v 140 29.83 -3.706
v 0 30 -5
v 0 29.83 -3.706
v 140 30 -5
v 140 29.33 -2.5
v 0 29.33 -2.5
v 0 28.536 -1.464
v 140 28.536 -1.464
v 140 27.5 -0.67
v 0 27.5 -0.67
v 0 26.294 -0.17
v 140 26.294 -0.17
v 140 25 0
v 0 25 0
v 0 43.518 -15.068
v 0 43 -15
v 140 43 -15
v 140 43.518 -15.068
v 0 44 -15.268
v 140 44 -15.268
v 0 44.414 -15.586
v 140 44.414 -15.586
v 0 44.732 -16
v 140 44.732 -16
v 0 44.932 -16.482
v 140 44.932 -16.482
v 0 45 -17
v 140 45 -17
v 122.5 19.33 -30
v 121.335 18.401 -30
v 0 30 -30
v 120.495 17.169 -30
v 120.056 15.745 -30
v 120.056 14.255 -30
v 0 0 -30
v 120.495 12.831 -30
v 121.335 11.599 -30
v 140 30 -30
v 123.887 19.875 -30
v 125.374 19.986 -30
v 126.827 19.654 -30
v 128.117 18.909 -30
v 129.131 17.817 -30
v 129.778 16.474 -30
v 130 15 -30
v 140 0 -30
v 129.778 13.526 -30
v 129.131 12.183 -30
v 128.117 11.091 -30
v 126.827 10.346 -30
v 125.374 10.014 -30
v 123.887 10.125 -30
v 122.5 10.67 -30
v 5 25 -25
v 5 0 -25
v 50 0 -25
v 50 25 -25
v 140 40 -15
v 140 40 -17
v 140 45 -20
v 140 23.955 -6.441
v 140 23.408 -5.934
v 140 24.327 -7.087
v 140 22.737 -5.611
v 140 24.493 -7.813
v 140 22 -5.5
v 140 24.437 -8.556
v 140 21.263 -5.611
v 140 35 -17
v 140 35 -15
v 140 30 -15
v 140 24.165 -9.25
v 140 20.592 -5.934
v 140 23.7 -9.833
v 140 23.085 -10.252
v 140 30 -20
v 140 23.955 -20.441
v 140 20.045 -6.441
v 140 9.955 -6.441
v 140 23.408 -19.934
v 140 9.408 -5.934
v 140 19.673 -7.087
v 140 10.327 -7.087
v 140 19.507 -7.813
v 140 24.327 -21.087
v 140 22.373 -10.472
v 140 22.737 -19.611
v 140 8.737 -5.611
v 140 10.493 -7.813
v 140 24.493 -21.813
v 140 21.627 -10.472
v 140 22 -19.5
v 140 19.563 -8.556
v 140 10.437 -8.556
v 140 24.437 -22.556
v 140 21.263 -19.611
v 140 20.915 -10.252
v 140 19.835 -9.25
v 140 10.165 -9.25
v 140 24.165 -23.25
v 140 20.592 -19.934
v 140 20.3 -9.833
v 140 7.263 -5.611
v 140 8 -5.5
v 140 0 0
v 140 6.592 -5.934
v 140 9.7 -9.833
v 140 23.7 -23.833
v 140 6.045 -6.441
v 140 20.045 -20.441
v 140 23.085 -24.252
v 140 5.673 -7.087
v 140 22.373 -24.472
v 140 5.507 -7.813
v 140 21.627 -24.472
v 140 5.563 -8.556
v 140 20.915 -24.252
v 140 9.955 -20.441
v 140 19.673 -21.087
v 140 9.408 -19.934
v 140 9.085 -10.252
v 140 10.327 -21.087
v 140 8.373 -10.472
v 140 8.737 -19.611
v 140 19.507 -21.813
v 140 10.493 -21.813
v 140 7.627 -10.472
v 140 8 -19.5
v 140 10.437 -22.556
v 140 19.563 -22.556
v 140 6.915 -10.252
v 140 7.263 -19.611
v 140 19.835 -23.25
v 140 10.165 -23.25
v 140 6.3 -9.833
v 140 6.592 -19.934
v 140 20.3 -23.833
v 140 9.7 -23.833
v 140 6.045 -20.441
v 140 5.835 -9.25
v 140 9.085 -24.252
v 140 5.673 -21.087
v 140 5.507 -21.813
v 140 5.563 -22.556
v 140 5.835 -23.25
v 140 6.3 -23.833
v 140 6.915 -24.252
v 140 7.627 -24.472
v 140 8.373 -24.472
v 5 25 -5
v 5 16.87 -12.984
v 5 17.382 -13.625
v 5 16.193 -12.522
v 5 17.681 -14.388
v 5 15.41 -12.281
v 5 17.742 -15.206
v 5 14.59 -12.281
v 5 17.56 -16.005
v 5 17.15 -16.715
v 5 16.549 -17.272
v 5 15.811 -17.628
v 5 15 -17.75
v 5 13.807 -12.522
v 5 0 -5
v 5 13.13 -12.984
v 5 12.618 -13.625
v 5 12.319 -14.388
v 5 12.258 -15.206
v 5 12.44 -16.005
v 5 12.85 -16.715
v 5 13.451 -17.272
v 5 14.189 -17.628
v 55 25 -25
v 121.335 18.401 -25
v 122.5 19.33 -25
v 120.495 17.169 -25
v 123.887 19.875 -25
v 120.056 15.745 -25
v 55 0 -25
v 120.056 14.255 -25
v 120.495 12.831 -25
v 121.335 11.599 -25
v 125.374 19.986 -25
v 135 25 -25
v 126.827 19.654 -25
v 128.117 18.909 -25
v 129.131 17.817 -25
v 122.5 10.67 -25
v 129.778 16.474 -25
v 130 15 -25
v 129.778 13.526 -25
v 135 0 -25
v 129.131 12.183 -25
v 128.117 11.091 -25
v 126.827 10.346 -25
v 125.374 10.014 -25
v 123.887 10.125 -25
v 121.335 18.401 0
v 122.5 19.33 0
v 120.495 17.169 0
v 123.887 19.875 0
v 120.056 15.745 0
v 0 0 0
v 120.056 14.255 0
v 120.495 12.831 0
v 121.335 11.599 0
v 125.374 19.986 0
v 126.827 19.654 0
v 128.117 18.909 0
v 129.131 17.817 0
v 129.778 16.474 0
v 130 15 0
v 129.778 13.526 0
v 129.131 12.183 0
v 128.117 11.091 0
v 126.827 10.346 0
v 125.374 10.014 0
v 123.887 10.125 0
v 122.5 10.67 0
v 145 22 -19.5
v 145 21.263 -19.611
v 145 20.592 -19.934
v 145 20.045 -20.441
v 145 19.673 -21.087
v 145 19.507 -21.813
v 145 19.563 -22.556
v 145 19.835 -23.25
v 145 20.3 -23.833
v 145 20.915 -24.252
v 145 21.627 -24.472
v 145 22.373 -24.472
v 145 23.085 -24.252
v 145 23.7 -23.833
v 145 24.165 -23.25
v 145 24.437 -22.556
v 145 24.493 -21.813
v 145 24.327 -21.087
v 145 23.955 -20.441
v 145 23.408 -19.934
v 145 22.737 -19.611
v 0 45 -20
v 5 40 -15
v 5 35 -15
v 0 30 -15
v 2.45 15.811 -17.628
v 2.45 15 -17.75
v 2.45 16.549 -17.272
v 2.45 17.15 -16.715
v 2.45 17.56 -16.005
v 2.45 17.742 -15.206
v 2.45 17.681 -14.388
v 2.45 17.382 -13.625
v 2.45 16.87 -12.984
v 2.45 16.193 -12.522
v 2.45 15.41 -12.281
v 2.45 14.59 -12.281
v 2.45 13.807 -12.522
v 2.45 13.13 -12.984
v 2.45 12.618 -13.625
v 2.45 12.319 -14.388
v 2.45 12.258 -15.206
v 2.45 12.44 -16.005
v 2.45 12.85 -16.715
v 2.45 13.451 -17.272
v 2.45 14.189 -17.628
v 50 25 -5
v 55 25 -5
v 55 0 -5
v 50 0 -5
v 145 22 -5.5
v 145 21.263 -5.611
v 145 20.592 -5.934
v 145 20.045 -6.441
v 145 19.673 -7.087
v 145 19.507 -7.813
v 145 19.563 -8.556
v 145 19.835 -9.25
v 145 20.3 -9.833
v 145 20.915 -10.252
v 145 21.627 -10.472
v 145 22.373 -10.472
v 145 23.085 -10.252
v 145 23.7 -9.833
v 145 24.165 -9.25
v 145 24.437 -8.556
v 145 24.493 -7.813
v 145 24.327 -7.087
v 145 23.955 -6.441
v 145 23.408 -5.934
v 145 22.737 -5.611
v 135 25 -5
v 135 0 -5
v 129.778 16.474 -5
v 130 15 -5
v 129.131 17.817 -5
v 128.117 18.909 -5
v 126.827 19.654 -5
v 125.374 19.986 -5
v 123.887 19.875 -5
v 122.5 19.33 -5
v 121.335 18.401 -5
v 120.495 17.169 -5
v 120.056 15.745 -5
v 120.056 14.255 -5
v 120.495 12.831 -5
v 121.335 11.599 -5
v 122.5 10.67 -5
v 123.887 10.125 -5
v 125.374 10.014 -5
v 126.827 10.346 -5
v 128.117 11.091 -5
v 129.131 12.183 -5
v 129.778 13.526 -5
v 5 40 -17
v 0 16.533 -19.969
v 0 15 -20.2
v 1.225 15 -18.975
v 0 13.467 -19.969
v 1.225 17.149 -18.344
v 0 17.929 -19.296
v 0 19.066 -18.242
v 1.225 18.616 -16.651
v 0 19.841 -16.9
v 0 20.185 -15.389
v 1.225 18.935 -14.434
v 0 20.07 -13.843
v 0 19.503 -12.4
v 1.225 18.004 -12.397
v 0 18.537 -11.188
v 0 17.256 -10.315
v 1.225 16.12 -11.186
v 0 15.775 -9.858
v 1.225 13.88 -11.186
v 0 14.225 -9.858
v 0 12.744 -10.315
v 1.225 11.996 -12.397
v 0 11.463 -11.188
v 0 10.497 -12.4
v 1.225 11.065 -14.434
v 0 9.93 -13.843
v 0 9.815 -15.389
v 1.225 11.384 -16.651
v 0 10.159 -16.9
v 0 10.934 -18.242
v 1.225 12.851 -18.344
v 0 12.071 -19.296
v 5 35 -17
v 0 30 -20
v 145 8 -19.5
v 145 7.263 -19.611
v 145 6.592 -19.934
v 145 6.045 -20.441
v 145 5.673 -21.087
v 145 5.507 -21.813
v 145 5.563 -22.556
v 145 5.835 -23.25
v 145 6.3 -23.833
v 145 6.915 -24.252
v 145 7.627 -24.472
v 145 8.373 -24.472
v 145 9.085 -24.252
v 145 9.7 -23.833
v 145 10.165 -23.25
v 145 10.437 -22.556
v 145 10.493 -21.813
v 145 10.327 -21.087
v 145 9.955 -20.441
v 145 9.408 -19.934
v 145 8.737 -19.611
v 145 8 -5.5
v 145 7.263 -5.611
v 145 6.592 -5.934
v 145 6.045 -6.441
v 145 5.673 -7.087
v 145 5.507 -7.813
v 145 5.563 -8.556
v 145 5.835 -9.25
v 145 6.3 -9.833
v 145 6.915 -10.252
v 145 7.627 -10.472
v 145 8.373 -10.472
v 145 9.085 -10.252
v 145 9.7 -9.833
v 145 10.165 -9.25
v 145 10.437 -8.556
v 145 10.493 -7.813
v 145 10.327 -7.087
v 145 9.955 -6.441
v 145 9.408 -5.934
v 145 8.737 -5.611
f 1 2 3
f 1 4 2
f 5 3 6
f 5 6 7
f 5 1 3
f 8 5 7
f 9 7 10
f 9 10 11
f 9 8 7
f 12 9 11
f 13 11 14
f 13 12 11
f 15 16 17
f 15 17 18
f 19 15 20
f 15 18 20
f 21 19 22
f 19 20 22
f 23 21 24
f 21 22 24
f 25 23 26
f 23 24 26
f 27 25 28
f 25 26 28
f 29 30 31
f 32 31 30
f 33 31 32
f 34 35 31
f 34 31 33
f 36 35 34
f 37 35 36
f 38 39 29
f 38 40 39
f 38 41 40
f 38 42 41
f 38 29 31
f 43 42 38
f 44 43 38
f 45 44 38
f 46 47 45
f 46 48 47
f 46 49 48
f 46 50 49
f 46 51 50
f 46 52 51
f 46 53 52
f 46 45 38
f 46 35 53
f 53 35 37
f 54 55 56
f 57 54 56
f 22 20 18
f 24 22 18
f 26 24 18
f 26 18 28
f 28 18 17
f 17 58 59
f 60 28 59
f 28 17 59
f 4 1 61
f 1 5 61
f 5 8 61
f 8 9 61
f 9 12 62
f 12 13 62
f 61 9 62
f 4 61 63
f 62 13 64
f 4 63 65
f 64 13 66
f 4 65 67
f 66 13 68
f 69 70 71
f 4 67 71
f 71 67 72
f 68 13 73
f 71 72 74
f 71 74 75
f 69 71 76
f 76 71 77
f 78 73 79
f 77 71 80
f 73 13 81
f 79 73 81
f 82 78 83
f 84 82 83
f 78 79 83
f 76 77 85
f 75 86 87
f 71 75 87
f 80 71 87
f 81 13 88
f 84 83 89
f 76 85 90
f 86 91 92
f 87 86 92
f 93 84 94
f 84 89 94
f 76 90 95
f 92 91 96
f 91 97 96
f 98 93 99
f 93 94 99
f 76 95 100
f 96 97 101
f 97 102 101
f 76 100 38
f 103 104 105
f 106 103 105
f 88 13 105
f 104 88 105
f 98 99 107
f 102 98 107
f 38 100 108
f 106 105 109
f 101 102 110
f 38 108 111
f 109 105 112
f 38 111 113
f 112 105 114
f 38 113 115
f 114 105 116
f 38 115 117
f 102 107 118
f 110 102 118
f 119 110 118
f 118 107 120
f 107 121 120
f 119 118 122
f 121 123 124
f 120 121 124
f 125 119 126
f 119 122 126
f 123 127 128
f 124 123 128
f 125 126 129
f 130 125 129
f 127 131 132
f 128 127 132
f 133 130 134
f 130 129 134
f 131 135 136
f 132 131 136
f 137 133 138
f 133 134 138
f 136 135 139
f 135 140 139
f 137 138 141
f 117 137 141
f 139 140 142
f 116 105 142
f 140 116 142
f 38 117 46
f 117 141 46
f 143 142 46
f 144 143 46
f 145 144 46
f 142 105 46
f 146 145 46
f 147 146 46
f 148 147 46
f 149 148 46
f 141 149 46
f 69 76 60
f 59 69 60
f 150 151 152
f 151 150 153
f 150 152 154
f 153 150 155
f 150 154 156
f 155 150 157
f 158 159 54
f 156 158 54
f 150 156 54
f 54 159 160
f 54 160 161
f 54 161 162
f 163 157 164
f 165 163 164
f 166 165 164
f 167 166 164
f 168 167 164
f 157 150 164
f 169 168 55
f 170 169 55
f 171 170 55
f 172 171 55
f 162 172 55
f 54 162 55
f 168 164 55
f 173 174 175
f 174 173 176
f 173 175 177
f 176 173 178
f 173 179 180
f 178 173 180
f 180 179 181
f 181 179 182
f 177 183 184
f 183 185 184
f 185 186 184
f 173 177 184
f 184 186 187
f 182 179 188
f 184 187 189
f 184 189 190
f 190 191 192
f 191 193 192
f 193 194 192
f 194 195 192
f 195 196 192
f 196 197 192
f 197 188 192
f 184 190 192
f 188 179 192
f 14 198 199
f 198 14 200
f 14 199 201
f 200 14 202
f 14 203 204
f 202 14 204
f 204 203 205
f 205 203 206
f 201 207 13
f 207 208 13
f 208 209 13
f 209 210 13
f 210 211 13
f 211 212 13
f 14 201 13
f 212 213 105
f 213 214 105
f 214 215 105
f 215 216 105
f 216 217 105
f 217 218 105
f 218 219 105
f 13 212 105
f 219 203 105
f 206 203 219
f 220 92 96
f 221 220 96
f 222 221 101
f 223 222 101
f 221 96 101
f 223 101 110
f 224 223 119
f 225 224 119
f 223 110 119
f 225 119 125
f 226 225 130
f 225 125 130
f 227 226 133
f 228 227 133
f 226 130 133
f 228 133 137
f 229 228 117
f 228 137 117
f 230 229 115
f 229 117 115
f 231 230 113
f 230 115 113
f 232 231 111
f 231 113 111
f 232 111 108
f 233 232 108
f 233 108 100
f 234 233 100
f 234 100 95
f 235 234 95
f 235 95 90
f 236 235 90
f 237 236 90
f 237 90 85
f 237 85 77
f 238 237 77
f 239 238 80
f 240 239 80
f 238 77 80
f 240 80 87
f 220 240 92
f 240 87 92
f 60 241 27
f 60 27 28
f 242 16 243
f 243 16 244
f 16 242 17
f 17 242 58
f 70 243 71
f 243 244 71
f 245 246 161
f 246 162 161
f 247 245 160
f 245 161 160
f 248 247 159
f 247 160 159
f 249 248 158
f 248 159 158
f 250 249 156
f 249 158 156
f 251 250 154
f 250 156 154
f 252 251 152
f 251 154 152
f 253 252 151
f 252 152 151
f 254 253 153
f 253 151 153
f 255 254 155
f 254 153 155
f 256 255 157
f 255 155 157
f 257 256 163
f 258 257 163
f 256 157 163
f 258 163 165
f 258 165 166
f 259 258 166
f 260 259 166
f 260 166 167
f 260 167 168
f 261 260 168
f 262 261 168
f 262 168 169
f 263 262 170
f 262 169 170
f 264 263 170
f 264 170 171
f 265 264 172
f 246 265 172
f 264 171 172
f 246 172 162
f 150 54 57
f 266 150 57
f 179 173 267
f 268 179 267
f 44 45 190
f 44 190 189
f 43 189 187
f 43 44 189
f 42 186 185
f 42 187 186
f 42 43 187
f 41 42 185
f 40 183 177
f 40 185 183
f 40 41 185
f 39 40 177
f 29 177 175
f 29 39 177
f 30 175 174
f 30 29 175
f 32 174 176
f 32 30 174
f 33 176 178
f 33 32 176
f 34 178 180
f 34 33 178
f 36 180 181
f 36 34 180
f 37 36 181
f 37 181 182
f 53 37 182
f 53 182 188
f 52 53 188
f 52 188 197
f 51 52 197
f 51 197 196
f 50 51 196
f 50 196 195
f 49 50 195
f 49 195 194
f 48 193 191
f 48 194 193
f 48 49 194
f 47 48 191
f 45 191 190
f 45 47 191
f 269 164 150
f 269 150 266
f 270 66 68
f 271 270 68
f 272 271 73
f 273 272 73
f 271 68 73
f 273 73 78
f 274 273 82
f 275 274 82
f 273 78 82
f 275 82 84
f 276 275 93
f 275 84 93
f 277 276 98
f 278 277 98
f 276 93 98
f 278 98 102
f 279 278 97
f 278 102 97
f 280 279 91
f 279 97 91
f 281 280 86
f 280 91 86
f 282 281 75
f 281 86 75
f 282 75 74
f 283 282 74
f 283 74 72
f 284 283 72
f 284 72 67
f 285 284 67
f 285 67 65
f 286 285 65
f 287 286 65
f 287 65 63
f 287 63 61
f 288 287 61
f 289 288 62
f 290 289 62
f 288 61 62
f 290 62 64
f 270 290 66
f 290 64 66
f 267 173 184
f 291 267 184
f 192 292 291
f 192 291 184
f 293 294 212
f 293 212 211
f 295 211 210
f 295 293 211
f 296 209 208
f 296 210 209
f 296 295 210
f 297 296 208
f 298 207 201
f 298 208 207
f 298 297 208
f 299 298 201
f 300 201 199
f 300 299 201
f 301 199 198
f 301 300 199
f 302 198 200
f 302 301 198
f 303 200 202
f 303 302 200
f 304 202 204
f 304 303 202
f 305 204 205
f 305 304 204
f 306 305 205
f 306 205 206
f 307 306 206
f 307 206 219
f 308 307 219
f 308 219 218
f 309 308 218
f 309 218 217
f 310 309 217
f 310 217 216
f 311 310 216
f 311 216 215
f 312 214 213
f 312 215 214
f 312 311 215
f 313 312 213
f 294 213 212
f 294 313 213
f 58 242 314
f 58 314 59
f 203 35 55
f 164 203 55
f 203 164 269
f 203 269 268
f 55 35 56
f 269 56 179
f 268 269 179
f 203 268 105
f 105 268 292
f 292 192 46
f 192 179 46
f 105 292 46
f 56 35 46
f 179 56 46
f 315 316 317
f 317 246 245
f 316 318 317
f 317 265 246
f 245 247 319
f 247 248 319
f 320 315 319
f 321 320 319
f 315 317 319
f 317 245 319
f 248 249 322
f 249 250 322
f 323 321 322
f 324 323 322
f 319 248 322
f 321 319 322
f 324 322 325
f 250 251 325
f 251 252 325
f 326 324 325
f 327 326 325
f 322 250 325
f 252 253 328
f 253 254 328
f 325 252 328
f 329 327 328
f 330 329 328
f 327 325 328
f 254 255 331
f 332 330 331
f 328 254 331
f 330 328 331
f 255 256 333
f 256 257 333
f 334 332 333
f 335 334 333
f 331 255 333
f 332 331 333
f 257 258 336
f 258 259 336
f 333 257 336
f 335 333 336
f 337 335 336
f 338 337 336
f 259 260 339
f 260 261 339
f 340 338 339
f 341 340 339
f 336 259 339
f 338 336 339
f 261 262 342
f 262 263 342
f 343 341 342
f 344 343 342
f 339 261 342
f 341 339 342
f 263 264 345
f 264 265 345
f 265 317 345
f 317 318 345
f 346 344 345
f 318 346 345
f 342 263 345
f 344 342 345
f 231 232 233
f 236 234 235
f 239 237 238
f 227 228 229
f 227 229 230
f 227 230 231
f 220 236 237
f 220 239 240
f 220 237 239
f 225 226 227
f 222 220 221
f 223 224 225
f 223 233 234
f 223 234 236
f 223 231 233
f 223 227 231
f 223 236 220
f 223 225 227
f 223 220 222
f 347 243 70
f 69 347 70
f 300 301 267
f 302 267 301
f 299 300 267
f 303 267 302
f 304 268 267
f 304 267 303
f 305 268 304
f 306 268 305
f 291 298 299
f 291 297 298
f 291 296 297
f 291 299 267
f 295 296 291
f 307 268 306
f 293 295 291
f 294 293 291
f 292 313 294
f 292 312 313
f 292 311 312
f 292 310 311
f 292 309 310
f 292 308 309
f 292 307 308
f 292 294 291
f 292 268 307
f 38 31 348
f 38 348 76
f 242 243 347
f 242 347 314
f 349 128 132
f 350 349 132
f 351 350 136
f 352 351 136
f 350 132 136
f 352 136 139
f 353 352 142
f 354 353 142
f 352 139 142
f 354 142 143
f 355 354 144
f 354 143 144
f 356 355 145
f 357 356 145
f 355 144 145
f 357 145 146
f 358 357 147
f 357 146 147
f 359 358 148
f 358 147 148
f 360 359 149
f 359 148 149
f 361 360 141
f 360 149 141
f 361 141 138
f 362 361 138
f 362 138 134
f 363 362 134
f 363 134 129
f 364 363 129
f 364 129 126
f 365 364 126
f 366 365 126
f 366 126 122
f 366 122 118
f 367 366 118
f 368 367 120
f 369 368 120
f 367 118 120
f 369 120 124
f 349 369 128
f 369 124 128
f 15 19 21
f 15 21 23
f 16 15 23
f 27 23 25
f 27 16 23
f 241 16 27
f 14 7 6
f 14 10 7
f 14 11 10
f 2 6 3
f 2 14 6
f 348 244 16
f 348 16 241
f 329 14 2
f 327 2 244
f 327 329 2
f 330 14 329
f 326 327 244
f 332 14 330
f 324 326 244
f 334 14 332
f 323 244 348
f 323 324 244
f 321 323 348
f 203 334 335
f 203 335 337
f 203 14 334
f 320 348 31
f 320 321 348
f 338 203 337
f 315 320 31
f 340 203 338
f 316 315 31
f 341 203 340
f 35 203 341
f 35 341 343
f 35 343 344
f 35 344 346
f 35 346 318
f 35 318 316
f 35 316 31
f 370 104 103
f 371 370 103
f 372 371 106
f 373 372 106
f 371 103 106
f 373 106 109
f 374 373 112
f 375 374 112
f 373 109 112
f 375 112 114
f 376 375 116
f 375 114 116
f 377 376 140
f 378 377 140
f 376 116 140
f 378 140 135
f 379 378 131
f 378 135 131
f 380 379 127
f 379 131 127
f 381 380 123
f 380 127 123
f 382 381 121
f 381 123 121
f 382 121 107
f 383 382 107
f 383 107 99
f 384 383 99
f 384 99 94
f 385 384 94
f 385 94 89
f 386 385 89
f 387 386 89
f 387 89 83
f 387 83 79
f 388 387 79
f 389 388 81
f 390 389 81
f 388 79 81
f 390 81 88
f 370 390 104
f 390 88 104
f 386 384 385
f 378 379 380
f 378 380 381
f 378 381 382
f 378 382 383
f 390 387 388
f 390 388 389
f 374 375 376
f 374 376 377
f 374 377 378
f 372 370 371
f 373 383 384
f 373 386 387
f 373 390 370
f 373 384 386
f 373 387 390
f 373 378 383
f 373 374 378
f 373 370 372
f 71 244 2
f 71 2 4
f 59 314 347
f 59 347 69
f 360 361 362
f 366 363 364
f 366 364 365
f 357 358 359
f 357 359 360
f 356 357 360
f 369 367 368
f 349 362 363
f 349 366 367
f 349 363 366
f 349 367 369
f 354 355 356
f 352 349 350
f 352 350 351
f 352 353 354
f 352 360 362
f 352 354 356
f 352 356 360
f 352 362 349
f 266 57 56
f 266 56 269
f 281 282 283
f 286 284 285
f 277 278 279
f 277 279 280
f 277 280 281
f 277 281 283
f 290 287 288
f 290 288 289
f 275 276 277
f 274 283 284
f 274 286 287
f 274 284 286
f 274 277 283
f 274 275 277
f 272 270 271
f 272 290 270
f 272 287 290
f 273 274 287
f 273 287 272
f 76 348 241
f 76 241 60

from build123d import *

# Parameters (mm, degrees)
SKETCH1_W                                       = 140
SKETCH1_H                                       = 30
BOSS_EXTRUDE1_DEPTH                             = 30
SHELL1_T                                        = -5
SKETCH3_W                                       = 5
SKETCH3_H                                       = 20
BOSS_EXTRUDE2_DEPTH                             = 25
SKETCH4_R                                       = 2.5
BOSS_EXTRUDE3_DEPTH                             = 5
SKETCH5_R                                       = 1.5
CUT_EXTRUDE1_DEPTH                              = 20
CUT_EXTRUDE2_DEPTH                              = 152.079449297
CUT_EXTRUDE2_DEPTH_BACK                         = 152.079449297
SKETCH9_R                                       = 5
SKETCH10_W                                      = 140
SKETCH10_H                                      = 5
BOSS_EXTRUDE5_DEPTH                             = 15
SKETCH11_W                                      = 135
SKETCH11_H                                      = 5
CUT_EXTRUDE3_DEPTH                              = 2
FILLET1_R                                       = 2
CSK_FOR_M5_FLAT_HEAD_MACHINE_SCREW1_D           = 5.5
CSK_FOR_M5_FLAT_HEAD_MACHINE_SCREW1_DEPTH       = 20
CSK_FOR_M5_FLAT_HEAD_MACHINE_SCREW1_CSINK_D     = 10.4
CSK_FOR_M5_FLAT_HEAD_MACHINE_SCREW1_CSINK_ANGLE = 90
CSK_FOR_M5_FLAT_HEAD_MACHINE_SCREW1_TIP         = 1.652366702
FILLET2_R                                       = 5


with BuildPart() as part:
    # Sketch1 → Boss-Extrude1 (new body)
    with BuildSketch(Plane(origin=(0, 0, 0), x_dir=(1, 0, 0), z_dir=(0, 1, 0))):
        with Locations((70, 15)):
            Rectangle(SKETCH1_W, SKETCH1_H)
    extrude(amount=BOSS_EXTRUDE1_DEPTH)

    # Shell1
    shell1_openings = [part.faces().sort_by_distance(p)[0] for p in [
        (70, 0, -15),
    ]]
    offset(amount=SHELL1_T, openings=shell1_openings, kind=Kind.INTERSECTION)

    # Sketch3 → Boss-Extrude2 (add)
    with BuildSketch(Plane.XZ.offset(-25)):
        with Locations((52.5, -15)):
            Rectangle(SKETCH3_W, SKETCH3_H)
    extrude(amount=BOSS_EXTRUDE2_DEPTH)

    # Sketch4 → Boss-Extrude3 (add)
    with BuildSketch(Plane(origin=(140, 0, 0), x_dir=(0, 0, -1), z_dir=(1, 0, 0))):
        with Locations(Location((8, 22, 0), (0, 0, 180))):
            Circle(SKETCH4_R)
        with Locations(Location((22, 22, 0), (0, 0, 180))):
            Circle(SKETCH4_R)
        with Locations(Location((8, 8, 0), (0, 0, 180))):
            Circle(SKETCH4_R)
        with Locations(Location((22, 8, 0), (0, 0, 180))):
            Circle(SKETCH4_R)
    extrude(amount=BOSS_EXTRUDE3_DEPTH)

    # Sketch5 → Cut-Extrude1 (cut)
    with BuildSketch(Plane.ZY):
        with Locations((-15, 15)):
            Circle(SKETCH5_R)
    extrude(amount=-CUT_EXTRUDE1_DEPTH, mode=Mode.SUBTRACT)

    # Sketch9 → Cut-Extrude2 (cut, two sides: drawn at the far end of the back side and taken through both)
    with BuildSketch(Plane.XY.offset(-CUT_EXTRUDE2_DEPTH_BACK)):
        with Locations((125, 15)):
            Circle(SKETCH9_R)
    extrude(amount=CUT_EXTRUDE2_DEPTH + CUT_EXTRUDE2_DEPTH_BACK, mode=Mode.SUBTRACT)

    # Sketch10 → Boss-Extrude5 (add)
    with BuildSketch(Plane(origin=(0, 30, 0), x_dir=(1, 0, 0), z_dir=(0, 1, 0))):
        with Locations((70, 17.5)):
            Rectangle(SKETCH10_W, SKETCH10_H)
    extrude(amount=BOSS_EXTRUDE5_DEPTH)

    # Sketch11 → Cut-Extrude3 (cut)
    with BuildSketch(Plane.XY.offset(-15)):
        with Locations((72.5, 37.5)):
            Rectangle(SKETCH11_W, SKETCH11_H)
    extrude(amount=-CUT_EXTRUDE3_DEPTH, mode=Mode.SUBTRACT)

    # Fillet1
    fillet1_edges = [part.edges().sort_by_distance(p)[0] for p in [
        (70, 45, -15),
    ]]
    fillet(fillet1_edges, radius=FILLET1_R)

    # CSK for M5 Flat Head Machine Screw1
    with Locations(Plane.ZY):
        with Locations((-15, 15)):
            CounterSinkHole(CSK_FOR_M5_FLAT_HEAD_MACHINE_SCREW1_D / 2, CSK_FOR_M5_FLAT_HEAD_MACHINE_SCREW1_CSINK_D / 2, depth=CSK_FOR_M5_FLAT_HEAD_MACHINE_SCREW1_DEPTH, counter_sink_angle=CSK_FOR_M5_FLAT_HEAD_MACHINE_SCREW1_CSINK_ANGLE)
            with Locations((0, 0, -(CSK_FOR_M5_FLAT_HEAD_MACHINE_SCREW1_DEPTH + CSK_FOR_M5_FLAT_HEAD_MACHINE_SCREW1_TIP / 2))):  # 118° drill point
                Cone(0, CSK_FOR_M5_FLAT_HEAD_MACHINE_SCREW1_D / 2, CSK_FOR_M5_FLAT_HEAD_MACHINE_SCREW1_TIP, mode=Mode.SUBTRACT)

    # Fillet2
    fillet2_edges = [part.edges().sort_by_distance(p)[0] for p in [
        (70, 30, 0),
    ]]
    fillet(fillet2_edges, radius=FILLET2_R)


solid = part.part
